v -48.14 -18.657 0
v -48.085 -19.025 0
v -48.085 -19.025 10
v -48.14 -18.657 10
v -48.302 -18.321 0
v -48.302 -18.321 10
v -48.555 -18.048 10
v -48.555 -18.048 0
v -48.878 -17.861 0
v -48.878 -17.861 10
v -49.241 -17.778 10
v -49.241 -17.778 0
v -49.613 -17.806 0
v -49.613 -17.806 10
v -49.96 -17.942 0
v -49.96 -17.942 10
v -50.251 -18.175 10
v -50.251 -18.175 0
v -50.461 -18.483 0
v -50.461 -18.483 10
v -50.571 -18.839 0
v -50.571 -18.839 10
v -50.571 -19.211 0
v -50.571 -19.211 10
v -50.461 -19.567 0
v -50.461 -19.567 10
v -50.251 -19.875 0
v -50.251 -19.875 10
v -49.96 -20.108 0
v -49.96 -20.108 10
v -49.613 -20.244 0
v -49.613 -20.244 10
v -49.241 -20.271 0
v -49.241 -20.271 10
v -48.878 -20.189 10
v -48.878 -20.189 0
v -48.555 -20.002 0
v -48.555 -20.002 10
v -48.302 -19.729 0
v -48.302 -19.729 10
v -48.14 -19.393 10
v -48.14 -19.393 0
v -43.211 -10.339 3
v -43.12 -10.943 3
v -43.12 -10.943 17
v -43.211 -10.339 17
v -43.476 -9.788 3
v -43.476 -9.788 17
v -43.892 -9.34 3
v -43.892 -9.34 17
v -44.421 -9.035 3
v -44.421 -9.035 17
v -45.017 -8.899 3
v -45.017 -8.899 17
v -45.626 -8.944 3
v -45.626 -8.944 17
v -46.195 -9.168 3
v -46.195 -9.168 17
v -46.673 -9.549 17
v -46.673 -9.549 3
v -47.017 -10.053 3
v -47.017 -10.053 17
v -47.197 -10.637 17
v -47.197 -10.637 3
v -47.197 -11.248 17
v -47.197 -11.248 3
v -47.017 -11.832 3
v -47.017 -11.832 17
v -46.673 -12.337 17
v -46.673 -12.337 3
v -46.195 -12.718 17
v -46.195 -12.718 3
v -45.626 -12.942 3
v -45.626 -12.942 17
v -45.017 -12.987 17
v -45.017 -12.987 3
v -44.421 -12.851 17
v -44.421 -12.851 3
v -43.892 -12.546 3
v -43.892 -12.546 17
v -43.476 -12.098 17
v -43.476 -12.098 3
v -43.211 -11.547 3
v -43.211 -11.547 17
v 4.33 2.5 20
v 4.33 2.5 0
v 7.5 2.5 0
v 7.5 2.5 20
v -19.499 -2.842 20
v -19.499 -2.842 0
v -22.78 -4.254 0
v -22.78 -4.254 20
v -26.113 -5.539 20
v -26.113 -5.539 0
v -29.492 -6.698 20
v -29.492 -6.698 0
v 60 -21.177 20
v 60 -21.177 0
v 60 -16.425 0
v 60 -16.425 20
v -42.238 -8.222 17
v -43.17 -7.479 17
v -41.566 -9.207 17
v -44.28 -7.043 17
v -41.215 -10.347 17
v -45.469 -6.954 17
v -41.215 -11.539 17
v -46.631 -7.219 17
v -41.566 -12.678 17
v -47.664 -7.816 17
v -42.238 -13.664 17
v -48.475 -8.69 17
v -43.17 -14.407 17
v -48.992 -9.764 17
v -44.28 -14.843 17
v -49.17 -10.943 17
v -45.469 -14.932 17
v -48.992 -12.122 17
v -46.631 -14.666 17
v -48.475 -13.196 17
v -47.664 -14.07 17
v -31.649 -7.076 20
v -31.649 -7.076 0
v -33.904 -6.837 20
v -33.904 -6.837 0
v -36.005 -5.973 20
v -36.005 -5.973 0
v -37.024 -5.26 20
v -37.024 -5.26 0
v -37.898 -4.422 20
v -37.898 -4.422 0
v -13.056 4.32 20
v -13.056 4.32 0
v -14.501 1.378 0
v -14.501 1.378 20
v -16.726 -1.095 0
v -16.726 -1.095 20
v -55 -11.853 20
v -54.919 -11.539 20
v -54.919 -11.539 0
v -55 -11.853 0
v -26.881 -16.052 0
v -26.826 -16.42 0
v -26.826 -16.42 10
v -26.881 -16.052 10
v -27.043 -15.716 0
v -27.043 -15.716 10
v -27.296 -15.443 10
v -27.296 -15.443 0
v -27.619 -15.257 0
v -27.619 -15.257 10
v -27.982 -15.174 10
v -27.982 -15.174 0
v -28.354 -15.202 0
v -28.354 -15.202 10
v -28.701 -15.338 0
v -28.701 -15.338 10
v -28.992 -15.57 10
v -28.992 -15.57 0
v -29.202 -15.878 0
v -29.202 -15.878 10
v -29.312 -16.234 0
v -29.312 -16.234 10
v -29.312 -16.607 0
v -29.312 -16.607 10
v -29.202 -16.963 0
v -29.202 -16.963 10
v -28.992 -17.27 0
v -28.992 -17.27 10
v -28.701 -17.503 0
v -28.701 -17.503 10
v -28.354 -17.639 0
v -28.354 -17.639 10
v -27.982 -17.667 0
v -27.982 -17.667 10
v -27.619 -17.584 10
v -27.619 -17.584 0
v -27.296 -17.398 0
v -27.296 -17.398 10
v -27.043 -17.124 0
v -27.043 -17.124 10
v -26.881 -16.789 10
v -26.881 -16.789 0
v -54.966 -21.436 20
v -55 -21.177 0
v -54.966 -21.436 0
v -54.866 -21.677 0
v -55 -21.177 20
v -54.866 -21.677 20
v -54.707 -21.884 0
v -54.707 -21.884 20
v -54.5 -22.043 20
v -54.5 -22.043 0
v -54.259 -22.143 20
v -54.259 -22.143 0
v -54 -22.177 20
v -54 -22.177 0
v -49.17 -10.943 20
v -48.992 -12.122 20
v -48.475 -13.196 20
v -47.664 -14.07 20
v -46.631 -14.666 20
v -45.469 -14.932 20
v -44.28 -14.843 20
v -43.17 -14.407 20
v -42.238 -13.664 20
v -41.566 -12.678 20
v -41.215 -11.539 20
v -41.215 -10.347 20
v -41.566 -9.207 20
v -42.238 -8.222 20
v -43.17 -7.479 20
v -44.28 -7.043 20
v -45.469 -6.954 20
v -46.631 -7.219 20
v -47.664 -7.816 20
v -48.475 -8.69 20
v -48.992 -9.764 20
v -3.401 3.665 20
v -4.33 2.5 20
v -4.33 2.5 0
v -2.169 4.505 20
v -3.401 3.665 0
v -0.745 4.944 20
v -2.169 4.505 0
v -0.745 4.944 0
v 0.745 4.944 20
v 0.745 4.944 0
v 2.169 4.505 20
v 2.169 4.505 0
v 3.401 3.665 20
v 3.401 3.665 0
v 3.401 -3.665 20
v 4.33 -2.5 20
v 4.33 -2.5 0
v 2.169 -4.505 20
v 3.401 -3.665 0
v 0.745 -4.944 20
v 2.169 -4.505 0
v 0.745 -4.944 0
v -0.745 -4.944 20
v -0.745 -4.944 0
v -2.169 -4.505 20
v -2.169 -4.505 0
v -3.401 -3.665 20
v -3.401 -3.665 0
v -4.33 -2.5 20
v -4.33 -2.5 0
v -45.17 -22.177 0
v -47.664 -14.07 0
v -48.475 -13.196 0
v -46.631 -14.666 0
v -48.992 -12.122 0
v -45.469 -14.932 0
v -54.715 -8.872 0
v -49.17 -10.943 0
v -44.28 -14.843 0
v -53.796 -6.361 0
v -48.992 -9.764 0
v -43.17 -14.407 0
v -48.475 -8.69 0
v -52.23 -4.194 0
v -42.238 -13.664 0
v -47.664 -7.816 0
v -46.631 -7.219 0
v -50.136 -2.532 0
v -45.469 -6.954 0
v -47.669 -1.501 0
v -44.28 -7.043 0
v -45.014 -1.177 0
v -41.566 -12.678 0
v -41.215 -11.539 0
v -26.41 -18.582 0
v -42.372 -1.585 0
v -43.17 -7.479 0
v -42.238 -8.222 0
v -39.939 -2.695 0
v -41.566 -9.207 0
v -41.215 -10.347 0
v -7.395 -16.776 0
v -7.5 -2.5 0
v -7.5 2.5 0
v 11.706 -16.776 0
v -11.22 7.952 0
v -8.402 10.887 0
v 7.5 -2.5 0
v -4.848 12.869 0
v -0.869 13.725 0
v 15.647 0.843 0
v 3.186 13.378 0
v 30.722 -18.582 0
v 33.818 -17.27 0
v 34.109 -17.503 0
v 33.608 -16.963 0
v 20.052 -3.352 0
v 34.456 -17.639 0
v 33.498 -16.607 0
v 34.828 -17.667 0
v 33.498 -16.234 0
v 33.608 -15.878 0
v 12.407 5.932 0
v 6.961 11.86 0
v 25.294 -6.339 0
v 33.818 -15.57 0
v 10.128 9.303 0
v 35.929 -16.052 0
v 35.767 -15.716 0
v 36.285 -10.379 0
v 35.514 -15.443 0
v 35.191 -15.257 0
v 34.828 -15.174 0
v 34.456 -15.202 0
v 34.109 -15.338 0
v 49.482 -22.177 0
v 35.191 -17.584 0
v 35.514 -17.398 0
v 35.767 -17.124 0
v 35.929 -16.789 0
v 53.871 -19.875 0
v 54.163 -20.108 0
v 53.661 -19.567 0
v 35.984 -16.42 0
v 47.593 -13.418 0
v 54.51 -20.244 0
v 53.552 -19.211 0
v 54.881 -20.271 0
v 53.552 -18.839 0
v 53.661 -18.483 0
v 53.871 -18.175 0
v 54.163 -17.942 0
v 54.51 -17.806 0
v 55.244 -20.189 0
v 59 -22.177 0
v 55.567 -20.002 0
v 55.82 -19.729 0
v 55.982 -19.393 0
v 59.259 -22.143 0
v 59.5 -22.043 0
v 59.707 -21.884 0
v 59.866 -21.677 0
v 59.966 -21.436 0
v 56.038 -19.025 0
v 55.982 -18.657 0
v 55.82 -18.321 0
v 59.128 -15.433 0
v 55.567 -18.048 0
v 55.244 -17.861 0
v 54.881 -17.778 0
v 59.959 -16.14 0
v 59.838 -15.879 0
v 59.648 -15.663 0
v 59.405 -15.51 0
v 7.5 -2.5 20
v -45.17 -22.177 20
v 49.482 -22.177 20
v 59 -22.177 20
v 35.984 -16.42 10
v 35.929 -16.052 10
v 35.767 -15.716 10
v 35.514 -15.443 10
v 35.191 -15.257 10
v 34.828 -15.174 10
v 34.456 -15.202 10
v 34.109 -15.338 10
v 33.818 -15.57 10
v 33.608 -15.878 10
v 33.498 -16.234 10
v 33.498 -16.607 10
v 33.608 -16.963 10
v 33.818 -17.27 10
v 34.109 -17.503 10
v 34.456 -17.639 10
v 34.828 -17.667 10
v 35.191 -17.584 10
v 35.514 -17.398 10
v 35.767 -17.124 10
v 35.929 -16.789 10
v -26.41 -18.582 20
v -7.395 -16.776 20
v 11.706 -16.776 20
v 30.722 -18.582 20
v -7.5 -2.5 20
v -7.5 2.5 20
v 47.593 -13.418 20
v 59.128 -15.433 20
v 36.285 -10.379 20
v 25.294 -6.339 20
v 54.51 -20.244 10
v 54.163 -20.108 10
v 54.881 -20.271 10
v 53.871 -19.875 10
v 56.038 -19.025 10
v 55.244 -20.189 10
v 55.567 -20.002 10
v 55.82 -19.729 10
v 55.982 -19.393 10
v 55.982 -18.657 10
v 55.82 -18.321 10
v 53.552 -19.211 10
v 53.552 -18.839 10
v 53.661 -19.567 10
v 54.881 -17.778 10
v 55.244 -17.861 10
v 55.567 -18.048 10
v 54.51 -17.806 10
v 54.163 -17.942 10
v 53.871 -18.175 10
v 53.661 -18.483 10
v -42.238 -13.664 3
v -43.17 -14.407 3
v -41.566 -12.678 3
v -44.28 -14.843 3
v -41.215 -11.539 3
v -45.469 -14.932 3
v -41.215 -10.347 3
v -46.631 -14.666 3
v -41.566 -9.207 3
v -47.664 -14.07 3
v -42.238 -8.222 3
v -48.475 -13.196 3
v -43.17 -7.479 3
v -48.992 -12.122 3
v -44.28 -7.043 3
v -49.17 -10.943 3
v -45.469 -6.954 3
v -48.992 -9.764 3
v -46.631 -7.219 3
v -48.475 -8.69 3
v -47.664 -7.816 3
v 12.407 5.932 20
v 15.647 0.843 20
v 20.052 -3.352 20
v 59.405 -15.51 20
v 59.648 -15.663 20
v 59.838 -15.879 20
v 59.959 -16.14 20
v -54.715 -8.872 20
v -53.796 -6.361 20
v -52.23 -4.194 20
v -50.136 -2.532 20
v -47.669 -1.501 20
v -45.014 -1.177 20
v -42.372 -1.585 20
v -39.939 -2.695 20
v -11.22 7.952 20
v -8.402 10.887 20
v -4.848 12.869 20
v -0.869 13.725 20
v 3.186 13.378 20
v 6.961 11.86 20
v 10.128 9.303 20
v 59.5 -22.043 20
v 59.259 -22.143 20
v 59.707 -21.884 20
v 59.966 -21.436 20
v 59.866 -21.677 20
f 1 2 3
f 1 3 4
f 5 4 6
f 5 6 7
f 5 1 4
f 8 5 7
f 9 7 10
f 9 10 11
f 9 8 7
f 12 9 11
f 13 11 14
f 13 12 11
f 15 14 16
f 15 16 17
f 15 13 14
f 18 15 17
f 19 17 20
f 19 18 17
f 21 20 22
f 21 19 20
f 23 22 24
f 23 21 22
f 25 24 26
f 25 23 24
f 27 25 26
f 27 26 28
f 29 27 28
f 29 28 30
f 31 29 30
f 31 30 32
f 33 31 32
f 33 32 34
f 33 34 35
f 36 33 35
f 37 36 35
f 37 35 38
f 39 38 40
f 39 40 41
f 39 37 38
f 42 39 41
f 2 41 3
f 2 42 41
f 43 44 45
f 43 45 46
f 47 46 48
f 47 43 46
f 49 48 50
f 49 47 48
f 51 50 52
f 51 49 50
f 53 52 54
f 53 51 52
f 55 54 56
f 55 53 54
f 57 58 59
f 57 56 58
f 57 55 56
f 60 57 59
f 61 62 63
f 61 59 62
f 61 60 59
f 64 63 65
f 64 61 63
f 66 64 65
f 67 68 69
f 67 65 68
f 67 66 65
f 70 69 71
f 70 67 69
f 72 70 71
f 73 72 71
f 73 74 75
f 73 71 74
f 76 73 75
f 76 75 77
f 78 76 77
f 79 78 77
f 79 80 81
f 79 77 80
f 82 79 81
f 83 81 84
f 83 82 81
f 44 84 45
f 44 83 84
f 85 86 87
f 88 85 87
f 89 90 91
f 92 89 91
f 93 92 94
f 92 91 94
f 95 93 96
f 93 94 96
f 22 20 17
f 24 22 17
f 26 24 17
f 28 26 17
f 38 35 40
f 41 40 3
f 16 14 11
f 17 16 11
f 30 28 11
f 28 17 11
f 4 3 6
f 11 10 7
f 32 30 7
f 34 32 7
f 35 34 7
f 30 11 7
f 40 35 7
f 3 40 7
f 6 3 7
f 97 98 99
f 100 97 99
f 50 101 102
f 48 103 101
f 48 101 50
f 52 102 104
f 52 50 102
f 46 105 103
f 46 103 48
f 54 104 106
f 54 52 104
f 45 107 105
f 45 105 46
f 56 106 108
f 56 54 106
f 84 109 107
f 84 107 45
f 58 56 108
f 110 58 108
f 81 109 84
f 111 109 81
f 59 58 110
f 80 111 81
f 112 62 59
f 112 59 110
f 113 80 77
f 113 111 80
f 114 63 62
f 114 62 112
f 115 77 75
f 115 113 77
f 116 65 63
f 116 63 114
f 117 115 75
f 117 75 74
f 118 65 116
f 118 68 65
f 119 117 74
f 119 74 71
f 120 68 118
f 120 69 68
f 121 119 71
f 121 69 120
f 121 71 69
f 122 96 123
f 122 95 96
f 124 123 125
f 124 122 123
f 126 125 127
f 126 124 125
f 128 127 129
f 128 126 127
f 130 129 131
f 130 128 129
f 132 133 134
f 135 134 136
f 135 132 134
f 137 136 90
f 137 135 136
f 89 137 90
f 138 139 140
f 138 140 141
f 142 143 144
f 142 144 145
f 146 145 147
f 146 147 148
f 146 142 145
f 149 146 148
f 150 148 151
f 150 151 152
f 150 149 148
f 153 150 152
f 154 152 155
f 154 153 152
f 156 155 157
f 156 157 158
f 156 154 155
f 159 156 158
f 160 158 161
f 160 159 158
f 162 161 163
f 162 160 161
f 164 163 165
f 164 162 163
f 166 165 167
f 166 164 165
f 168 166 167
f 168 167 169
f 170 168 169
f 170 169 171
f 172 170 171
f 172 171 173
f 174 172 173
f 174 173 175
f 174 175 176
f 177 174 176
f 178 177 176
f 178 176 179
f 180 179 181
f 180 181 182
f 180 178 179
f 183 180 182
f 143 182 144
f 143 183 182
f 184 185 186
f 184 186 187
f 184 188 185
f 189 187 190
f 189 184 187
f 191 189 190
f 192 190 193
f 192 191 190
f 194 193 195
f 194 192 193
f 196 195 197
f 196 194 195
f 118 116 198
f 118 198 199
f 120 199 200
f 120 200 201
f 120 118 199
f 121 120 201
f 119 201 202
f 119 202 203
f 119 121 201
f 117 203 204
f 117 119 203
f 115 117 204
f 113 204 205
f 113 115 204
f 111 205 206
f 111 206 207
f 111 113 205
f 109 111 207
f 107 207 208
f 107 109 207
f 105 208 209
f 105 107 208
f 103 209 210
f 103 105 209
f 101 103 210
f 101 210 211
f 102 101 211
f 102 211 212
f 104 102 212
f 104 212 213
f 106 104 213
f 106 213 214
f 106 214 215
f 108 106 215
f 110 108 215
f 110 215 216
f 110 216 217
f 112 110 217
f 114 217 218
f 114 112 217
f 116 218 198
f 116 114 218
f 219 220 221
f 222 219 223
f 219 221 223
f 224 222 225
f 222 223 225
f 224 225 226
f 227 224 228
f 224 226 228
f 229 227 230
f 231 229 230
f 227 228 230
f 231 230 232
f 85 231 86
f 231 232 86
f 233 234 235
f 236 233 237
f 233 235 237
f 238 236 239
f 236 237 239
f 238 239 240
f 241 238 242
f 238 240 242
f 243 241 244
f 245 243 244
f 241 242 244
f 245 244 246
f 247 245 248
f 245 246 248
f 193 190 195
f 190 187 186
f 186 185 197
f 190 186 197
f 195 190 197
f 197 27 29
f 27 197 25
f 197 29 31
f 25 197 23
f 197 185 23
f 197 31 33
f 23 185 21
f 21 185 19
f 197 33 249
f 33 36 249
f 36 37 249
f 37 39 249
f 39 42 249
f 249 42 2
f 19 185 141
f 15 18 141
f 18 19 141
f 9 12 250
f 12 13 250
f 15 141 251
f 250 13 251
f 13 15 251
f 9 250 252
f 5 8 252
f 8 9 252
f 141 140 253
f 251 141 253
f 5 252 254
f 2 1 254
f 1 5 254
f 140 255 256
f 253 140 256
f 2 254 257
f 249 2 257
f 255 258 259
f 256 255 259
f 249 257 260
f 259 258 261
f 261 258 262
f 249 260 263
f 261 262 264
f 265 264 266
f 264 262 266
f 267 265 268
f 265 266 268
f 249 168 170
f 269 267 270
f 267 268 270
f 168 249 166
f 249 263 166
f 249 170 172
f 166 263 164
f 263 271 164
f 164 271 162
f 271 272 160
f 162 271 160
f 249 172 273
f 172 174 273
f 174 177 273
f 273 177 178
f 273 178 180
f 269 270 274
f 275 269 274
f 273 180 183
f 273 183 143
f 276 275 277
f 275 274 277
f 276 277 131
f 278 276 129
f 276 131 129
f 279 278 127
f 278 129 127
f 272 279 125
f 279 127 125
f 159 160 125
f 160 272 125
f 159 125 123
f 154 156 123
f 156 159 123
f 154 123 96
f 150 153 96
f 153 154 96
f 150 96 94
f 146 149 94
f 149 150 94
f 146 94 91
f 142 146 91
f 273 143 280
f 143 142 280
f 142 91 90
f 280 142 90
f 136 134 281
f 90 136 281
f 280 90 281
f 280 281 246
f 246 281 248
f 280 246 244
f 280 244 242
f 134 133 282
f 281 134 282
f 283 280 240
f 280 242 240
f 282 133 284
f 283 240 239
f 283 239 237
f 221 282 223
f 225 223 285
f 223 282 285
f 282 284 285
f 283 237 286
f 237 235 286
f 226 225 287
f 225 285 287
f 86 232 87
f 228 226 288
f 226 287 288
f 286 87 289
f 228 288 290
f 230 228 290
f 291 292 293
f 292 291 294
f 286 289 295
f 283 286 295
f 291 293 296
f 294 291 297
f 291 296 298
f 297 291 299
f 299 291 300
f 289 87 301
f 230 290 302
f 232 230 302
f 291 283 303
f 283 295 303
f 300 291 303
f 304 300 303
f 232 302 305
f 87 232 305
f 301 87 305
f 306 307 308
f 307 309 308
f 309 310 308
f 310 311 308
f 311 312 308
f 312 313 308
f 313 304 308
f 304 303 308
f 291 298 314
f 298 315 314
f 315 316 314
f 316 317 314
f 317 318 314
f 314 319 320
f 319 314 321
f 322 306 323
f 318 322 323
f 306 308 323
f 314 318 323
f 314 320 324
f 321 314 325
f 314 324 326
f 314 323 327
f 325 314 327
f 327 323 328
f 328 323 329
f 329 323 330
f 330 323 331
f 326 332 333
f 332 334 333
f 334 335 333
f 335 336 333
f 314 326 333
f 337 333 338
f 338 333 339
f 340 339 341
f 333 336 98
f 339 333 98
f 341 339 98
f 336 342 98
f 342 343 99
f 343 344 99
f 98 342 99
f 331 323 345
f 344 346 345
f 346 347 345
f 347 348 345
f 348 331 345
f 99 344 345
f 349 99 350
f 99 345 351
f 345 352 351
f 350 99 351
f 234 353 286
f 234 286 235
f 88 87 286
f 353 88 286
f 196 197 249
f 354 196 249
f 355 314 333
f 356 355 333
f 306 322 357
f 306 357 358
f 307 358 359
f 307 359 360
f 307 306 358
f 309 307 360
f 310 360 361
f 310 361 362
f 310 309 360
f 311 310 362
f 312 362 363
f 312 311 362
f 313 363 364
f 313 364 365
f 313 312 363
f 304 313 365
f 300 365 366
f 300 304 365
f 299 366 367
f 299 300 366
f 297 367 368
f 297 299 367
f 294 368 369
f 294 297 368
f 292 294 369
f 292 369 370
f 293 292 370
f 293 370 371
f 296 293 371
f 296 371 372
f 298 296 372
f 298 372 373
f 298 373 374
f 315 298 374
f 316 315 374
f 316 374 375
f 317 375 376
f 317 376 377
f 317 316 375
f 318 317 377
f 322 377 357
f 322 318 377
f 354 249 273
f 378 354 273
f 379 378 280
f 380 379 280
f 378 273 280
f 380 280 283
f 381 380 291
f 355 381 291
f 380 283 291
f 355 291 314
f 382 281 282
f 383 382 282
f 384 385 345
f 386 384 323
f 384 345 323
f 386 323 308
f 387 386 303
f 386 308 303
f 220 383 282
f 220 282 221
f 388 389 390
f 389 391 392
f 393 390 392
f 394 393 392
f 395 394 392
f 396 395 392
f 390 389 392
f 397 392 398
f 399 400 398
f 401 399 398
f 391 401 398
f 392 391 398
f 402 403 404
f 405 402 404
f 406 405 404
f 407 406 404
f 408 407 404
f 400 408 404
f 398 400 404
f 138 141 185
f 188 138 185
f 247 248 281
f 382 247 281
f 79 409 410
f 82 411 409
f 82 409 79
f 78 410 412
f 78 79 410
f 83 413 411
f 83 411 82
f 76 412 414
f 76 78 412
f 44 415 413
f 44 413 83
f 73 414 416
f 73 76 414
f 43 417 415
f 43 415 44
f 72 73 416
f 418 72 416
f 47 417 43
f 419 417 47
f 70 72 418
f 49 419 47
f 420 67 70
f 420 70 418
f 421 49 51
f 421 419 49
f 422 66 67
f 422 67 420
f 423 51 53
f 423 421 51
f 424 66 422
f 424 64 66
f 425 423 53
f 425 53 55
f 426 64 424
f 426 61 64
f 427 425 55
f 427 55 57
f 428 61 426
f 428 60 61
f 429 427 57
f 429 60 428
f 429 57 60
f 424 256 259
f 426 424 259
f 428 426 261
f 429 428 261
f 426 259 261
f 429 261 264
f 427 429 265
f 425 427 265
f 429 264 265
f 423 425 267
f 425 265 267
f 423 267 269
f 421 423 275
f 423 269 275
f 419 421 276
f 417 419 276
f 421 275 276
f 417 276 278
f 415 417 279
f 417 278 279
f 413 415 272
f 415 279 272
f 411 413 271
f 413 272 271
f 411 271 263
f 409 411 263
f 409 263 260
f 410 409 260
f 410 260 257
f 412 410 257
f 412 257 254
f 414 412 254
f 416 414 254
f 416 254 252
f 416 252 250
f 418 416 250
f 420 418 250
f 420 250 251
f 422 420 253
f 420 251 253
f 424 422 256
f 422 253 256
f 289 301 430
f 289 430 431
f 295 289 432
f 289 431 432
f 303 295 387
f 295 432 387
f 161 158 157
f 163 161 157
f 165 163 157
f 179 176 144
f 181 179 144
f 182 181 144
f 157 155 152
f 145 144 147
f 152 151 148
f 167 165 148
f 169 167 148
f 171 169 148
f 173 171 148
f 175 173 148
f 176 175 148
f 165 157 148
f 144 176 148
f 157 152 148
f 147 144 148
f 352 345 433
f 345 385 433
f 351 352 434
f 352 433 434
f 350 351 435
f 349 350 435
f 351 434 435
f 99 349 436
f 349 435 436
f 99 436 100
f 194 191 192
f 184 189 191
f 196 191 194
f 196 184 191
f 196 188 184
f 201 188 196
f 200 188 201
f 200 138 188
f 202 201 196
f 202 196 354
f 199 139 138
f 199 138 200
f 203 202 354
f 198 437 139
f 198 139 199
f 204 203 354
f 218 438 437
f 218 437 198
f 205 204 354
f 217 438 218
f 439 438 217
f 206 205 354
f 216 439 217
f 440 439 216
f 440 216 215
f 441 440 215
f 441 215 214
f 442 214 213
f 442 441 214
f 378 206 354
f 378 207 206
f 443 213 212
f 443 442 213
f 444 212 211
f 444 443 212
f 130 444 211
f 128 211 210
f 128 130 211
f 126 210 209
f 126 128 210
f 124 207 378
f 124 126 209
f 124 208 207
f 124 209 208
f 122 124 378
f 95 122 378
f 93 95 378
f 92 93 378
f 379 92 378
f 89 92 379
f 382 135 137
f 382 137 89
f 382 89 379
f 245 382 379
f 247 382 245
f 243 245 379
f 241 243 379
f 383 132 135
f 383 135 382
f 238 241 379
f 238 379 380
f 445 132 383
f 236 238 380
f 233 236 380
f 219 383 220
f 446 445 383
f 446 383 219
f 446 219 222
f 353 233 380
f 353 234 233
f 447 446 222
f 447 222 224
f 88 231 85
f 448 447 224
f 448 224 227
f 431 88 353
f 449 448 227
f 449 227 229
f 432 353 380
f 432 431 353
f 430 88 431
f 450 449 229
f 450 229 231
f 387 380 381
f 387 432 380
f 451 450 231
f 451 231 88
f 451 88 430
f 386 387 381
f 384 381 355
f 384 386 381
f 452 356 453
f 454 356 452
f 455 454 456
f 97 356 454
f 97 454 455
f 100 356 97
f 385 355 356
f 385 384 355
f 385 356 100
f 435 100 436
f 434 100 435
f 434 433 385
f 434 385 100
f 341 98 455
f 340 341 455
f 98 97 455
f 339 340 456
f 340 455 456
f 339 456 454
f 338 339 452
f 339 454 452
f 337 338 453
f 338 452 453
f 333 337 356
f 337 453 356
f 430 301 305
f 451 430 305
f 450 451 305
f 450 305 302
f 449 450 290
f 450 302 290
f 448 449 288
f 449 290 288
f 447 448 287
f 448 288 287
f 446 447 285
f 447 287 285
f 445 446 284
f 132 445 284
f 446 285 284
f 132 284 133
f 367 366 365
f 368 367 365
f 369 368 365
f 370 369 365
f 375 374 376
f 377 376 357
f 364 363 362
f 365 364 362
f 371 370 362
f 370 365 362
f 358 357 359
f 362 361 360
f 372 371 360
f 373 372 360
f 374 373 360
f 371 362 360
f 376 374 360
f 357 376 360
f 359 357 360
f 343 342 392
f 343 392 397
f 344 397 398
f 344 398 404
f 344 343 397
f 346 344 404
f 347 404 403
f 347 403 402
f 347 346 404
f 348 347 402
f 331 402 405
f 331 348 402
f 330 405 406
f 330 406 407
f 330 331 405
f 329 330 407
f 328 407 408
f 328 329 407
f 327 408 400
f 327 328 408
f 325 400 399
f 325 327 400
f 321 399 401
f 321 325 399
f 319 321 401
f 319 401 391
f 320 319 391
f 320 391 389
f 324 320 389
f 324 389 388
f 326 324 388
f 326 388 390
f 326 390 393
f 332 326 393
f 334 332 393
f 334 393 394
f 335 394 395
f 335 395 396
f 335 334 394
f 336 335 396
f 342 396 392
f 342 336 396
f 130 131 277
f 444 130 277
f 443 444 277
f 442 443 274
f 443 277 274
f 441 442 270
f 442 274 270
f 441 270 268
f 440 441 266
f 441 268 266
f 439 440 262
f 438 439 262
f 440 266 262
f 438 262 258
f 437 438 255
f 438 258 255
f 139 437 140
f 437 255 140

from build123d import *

# Parameters (mm, degrees)
SKETCH_1_R          = 2.05
EXTRUDE_1_DEPTH     = 20
FILLET_1_R          = 12
FILLET_2_R          = 8
FILLET_3_R          = 1
FILLET_4_R          = 25
SKETCH_6_R          = 4
CUT_EXTRUDE_5_DEPTH = 3
SKETCH_7_R          = 1.25
CUT_EXTRUDE1_DEPTH  = 10
CUT_EXTRUDE2_START  = -3
SKETCH1_R           = 4
CUT_EXTRUDE2_DEPTH  = 3


with BuildPart() as part:
    # 草图1 → 凸台-拉伸1 (new body)
    with BuildSketch(Plane.XY):
        with BuildLine():
            Line((13.750969278, -0.819876155), (13.750969278, -0.183047918))
            ThreePointArc((13.750969278, -0.183047918), (0.091525986, 13.751882984), (-13.752187557, 0))
            ThreePointArc((-13.752187557, 0), (-24.470803545, -4.924054358), (-35.721657685, -8.467120986))
            ThreePointArc((-35.721657685, -8.467120986), (-46.713142569, -1.298230159), (-54.919247866, -11.538619386))
            Line((-54.919247866, -11.538619386), (-55, -11.852756493))
            Line((-55, -11.852756493), (-55, -22.177115611))
            Line((-55, -22.177115611), (-45.17004572, -22.177115611))
            ThreePointArc((-45.17004572, -22.177115611), (2.155746263, -16.550210115), (49.481538246, -22.177115611))
            Line((49.481538246, -22.177115611), (60, -22.177115611))
            Line((60, -22.177115611), (60, -15.54238751))
            ThreePointArc((60, -15.54238751), (36.185940998, -10.347251745), (13.750969278, -0.819876155))
        make_face()
        with Locations((-45.17004572, -10.942949795)):
            Circle(SKETCH_1_R, mode=Mode.SUBTRACT)
        with BuildLine():
            Line((-7.5, -2.5), (-7.5, 2.5))
            Line((-7.5, 2.5), (-4.330127019, 2.5))
            ThreePointArc((-4.330127019, 2.5), (0, 5), (4.330127019, 2.5))
            Line((4.330127019, 2.5), (7.5, 2.5))
            Line((7.5, 2.5), (7.5, -2.5))
            Line((7.5, -2.5), (4.330127019, -2.5))
            ThreePointArc((4.330127019, -2.5), (0, -5), (-4.330127019, -2.5))
            Line((-4.330127019, -2.5), (-7.5, -2.5))
        make_face(mode=Mode.SUBTRACT)
    extrude(amount=EXTRUDE_1_DEPTH)

    # 圆角1
    fillet_1_edges = [part.edges().sort_by_distance(p)[0] for p in [
        (-13.752187557, 0, 10),
    ]]
    fillet(fillet_1_edges, radius=FILLET_1_R)

    # 圆角2
    fillet_2_edges = [part.edges().sort_by_distance(p)[0] for p in [
        (-35.721657685, -8.467120986, 10),
    ]]
    fillet(fillet_2_edges, radius=FILLET_2_R)

    # 圆角3
    fillet_3_edges = [part.edges().sort_by_distance(p)[0] for p in [
        (60, -15.54238751, 10),
        (60, -22.177115611, 10),
        (-55, -22.177115611, 10),
    ]]
    fillet(fillet_3_edges, radius=FILLET_3_R)

    # 圆角4
    fillet_4_edges = [part.edges().sort_by_distance(p)[0] for p in [
        (13.750969278, -0.819876155, 10),
    ]]
    fillet(fillet_4_edges, radius=FILLET_4_R)

    # 草图6 → 切除-拉伸5 (cut)
    with BuildSketch(Plane(origin=(0, 0, 0), x_dir=(-1, 0, 0), z_dir=(0, 0, -1))):
        with Locations((45.17004572, -10.942949795)):
            Circle(SKETCH_6_R)
    extrude(amount=-CUT_EXTRUDE_5_DEPTH, mode=Mode.SUBTRACT)

    # 草图7 → Cut-Extrude1 (cut)
    with BuildSketch(Plane.XY):
        with Locations((-49.334528207, -19.024990649)):
            Circle(SKETCH_7_R)
        with Locations((54.787690727, -19.024990649)):
            Circle(SKETCH_7_R)
        with Locations((34.734293207, -16.420229149)):
            Circle(SKETCH_7_R)
        with Locations((-28.075836585, -16.420229149)):
            Circle(SKETCH_7_R)
    extrude(amount=CUT_EXTRUDE1_DEPTH, mode=Mode.SUBTRACT)

    # Sketch1 → Cut-Extrude2 (cut)
    with BuildSketch(Plane.XY.offset(20).offset(CUT_EXTRUDE2_START)):
        with Locations(Location((-45.17004572, -10.942949795, 0), (0, 0, 180))):
            Circle(SKETCH1_R)
    extrude(amount=CUT_EXTRUDE2_DEPTH, mode=Mode.SUBTRACT)


solid = part.part
